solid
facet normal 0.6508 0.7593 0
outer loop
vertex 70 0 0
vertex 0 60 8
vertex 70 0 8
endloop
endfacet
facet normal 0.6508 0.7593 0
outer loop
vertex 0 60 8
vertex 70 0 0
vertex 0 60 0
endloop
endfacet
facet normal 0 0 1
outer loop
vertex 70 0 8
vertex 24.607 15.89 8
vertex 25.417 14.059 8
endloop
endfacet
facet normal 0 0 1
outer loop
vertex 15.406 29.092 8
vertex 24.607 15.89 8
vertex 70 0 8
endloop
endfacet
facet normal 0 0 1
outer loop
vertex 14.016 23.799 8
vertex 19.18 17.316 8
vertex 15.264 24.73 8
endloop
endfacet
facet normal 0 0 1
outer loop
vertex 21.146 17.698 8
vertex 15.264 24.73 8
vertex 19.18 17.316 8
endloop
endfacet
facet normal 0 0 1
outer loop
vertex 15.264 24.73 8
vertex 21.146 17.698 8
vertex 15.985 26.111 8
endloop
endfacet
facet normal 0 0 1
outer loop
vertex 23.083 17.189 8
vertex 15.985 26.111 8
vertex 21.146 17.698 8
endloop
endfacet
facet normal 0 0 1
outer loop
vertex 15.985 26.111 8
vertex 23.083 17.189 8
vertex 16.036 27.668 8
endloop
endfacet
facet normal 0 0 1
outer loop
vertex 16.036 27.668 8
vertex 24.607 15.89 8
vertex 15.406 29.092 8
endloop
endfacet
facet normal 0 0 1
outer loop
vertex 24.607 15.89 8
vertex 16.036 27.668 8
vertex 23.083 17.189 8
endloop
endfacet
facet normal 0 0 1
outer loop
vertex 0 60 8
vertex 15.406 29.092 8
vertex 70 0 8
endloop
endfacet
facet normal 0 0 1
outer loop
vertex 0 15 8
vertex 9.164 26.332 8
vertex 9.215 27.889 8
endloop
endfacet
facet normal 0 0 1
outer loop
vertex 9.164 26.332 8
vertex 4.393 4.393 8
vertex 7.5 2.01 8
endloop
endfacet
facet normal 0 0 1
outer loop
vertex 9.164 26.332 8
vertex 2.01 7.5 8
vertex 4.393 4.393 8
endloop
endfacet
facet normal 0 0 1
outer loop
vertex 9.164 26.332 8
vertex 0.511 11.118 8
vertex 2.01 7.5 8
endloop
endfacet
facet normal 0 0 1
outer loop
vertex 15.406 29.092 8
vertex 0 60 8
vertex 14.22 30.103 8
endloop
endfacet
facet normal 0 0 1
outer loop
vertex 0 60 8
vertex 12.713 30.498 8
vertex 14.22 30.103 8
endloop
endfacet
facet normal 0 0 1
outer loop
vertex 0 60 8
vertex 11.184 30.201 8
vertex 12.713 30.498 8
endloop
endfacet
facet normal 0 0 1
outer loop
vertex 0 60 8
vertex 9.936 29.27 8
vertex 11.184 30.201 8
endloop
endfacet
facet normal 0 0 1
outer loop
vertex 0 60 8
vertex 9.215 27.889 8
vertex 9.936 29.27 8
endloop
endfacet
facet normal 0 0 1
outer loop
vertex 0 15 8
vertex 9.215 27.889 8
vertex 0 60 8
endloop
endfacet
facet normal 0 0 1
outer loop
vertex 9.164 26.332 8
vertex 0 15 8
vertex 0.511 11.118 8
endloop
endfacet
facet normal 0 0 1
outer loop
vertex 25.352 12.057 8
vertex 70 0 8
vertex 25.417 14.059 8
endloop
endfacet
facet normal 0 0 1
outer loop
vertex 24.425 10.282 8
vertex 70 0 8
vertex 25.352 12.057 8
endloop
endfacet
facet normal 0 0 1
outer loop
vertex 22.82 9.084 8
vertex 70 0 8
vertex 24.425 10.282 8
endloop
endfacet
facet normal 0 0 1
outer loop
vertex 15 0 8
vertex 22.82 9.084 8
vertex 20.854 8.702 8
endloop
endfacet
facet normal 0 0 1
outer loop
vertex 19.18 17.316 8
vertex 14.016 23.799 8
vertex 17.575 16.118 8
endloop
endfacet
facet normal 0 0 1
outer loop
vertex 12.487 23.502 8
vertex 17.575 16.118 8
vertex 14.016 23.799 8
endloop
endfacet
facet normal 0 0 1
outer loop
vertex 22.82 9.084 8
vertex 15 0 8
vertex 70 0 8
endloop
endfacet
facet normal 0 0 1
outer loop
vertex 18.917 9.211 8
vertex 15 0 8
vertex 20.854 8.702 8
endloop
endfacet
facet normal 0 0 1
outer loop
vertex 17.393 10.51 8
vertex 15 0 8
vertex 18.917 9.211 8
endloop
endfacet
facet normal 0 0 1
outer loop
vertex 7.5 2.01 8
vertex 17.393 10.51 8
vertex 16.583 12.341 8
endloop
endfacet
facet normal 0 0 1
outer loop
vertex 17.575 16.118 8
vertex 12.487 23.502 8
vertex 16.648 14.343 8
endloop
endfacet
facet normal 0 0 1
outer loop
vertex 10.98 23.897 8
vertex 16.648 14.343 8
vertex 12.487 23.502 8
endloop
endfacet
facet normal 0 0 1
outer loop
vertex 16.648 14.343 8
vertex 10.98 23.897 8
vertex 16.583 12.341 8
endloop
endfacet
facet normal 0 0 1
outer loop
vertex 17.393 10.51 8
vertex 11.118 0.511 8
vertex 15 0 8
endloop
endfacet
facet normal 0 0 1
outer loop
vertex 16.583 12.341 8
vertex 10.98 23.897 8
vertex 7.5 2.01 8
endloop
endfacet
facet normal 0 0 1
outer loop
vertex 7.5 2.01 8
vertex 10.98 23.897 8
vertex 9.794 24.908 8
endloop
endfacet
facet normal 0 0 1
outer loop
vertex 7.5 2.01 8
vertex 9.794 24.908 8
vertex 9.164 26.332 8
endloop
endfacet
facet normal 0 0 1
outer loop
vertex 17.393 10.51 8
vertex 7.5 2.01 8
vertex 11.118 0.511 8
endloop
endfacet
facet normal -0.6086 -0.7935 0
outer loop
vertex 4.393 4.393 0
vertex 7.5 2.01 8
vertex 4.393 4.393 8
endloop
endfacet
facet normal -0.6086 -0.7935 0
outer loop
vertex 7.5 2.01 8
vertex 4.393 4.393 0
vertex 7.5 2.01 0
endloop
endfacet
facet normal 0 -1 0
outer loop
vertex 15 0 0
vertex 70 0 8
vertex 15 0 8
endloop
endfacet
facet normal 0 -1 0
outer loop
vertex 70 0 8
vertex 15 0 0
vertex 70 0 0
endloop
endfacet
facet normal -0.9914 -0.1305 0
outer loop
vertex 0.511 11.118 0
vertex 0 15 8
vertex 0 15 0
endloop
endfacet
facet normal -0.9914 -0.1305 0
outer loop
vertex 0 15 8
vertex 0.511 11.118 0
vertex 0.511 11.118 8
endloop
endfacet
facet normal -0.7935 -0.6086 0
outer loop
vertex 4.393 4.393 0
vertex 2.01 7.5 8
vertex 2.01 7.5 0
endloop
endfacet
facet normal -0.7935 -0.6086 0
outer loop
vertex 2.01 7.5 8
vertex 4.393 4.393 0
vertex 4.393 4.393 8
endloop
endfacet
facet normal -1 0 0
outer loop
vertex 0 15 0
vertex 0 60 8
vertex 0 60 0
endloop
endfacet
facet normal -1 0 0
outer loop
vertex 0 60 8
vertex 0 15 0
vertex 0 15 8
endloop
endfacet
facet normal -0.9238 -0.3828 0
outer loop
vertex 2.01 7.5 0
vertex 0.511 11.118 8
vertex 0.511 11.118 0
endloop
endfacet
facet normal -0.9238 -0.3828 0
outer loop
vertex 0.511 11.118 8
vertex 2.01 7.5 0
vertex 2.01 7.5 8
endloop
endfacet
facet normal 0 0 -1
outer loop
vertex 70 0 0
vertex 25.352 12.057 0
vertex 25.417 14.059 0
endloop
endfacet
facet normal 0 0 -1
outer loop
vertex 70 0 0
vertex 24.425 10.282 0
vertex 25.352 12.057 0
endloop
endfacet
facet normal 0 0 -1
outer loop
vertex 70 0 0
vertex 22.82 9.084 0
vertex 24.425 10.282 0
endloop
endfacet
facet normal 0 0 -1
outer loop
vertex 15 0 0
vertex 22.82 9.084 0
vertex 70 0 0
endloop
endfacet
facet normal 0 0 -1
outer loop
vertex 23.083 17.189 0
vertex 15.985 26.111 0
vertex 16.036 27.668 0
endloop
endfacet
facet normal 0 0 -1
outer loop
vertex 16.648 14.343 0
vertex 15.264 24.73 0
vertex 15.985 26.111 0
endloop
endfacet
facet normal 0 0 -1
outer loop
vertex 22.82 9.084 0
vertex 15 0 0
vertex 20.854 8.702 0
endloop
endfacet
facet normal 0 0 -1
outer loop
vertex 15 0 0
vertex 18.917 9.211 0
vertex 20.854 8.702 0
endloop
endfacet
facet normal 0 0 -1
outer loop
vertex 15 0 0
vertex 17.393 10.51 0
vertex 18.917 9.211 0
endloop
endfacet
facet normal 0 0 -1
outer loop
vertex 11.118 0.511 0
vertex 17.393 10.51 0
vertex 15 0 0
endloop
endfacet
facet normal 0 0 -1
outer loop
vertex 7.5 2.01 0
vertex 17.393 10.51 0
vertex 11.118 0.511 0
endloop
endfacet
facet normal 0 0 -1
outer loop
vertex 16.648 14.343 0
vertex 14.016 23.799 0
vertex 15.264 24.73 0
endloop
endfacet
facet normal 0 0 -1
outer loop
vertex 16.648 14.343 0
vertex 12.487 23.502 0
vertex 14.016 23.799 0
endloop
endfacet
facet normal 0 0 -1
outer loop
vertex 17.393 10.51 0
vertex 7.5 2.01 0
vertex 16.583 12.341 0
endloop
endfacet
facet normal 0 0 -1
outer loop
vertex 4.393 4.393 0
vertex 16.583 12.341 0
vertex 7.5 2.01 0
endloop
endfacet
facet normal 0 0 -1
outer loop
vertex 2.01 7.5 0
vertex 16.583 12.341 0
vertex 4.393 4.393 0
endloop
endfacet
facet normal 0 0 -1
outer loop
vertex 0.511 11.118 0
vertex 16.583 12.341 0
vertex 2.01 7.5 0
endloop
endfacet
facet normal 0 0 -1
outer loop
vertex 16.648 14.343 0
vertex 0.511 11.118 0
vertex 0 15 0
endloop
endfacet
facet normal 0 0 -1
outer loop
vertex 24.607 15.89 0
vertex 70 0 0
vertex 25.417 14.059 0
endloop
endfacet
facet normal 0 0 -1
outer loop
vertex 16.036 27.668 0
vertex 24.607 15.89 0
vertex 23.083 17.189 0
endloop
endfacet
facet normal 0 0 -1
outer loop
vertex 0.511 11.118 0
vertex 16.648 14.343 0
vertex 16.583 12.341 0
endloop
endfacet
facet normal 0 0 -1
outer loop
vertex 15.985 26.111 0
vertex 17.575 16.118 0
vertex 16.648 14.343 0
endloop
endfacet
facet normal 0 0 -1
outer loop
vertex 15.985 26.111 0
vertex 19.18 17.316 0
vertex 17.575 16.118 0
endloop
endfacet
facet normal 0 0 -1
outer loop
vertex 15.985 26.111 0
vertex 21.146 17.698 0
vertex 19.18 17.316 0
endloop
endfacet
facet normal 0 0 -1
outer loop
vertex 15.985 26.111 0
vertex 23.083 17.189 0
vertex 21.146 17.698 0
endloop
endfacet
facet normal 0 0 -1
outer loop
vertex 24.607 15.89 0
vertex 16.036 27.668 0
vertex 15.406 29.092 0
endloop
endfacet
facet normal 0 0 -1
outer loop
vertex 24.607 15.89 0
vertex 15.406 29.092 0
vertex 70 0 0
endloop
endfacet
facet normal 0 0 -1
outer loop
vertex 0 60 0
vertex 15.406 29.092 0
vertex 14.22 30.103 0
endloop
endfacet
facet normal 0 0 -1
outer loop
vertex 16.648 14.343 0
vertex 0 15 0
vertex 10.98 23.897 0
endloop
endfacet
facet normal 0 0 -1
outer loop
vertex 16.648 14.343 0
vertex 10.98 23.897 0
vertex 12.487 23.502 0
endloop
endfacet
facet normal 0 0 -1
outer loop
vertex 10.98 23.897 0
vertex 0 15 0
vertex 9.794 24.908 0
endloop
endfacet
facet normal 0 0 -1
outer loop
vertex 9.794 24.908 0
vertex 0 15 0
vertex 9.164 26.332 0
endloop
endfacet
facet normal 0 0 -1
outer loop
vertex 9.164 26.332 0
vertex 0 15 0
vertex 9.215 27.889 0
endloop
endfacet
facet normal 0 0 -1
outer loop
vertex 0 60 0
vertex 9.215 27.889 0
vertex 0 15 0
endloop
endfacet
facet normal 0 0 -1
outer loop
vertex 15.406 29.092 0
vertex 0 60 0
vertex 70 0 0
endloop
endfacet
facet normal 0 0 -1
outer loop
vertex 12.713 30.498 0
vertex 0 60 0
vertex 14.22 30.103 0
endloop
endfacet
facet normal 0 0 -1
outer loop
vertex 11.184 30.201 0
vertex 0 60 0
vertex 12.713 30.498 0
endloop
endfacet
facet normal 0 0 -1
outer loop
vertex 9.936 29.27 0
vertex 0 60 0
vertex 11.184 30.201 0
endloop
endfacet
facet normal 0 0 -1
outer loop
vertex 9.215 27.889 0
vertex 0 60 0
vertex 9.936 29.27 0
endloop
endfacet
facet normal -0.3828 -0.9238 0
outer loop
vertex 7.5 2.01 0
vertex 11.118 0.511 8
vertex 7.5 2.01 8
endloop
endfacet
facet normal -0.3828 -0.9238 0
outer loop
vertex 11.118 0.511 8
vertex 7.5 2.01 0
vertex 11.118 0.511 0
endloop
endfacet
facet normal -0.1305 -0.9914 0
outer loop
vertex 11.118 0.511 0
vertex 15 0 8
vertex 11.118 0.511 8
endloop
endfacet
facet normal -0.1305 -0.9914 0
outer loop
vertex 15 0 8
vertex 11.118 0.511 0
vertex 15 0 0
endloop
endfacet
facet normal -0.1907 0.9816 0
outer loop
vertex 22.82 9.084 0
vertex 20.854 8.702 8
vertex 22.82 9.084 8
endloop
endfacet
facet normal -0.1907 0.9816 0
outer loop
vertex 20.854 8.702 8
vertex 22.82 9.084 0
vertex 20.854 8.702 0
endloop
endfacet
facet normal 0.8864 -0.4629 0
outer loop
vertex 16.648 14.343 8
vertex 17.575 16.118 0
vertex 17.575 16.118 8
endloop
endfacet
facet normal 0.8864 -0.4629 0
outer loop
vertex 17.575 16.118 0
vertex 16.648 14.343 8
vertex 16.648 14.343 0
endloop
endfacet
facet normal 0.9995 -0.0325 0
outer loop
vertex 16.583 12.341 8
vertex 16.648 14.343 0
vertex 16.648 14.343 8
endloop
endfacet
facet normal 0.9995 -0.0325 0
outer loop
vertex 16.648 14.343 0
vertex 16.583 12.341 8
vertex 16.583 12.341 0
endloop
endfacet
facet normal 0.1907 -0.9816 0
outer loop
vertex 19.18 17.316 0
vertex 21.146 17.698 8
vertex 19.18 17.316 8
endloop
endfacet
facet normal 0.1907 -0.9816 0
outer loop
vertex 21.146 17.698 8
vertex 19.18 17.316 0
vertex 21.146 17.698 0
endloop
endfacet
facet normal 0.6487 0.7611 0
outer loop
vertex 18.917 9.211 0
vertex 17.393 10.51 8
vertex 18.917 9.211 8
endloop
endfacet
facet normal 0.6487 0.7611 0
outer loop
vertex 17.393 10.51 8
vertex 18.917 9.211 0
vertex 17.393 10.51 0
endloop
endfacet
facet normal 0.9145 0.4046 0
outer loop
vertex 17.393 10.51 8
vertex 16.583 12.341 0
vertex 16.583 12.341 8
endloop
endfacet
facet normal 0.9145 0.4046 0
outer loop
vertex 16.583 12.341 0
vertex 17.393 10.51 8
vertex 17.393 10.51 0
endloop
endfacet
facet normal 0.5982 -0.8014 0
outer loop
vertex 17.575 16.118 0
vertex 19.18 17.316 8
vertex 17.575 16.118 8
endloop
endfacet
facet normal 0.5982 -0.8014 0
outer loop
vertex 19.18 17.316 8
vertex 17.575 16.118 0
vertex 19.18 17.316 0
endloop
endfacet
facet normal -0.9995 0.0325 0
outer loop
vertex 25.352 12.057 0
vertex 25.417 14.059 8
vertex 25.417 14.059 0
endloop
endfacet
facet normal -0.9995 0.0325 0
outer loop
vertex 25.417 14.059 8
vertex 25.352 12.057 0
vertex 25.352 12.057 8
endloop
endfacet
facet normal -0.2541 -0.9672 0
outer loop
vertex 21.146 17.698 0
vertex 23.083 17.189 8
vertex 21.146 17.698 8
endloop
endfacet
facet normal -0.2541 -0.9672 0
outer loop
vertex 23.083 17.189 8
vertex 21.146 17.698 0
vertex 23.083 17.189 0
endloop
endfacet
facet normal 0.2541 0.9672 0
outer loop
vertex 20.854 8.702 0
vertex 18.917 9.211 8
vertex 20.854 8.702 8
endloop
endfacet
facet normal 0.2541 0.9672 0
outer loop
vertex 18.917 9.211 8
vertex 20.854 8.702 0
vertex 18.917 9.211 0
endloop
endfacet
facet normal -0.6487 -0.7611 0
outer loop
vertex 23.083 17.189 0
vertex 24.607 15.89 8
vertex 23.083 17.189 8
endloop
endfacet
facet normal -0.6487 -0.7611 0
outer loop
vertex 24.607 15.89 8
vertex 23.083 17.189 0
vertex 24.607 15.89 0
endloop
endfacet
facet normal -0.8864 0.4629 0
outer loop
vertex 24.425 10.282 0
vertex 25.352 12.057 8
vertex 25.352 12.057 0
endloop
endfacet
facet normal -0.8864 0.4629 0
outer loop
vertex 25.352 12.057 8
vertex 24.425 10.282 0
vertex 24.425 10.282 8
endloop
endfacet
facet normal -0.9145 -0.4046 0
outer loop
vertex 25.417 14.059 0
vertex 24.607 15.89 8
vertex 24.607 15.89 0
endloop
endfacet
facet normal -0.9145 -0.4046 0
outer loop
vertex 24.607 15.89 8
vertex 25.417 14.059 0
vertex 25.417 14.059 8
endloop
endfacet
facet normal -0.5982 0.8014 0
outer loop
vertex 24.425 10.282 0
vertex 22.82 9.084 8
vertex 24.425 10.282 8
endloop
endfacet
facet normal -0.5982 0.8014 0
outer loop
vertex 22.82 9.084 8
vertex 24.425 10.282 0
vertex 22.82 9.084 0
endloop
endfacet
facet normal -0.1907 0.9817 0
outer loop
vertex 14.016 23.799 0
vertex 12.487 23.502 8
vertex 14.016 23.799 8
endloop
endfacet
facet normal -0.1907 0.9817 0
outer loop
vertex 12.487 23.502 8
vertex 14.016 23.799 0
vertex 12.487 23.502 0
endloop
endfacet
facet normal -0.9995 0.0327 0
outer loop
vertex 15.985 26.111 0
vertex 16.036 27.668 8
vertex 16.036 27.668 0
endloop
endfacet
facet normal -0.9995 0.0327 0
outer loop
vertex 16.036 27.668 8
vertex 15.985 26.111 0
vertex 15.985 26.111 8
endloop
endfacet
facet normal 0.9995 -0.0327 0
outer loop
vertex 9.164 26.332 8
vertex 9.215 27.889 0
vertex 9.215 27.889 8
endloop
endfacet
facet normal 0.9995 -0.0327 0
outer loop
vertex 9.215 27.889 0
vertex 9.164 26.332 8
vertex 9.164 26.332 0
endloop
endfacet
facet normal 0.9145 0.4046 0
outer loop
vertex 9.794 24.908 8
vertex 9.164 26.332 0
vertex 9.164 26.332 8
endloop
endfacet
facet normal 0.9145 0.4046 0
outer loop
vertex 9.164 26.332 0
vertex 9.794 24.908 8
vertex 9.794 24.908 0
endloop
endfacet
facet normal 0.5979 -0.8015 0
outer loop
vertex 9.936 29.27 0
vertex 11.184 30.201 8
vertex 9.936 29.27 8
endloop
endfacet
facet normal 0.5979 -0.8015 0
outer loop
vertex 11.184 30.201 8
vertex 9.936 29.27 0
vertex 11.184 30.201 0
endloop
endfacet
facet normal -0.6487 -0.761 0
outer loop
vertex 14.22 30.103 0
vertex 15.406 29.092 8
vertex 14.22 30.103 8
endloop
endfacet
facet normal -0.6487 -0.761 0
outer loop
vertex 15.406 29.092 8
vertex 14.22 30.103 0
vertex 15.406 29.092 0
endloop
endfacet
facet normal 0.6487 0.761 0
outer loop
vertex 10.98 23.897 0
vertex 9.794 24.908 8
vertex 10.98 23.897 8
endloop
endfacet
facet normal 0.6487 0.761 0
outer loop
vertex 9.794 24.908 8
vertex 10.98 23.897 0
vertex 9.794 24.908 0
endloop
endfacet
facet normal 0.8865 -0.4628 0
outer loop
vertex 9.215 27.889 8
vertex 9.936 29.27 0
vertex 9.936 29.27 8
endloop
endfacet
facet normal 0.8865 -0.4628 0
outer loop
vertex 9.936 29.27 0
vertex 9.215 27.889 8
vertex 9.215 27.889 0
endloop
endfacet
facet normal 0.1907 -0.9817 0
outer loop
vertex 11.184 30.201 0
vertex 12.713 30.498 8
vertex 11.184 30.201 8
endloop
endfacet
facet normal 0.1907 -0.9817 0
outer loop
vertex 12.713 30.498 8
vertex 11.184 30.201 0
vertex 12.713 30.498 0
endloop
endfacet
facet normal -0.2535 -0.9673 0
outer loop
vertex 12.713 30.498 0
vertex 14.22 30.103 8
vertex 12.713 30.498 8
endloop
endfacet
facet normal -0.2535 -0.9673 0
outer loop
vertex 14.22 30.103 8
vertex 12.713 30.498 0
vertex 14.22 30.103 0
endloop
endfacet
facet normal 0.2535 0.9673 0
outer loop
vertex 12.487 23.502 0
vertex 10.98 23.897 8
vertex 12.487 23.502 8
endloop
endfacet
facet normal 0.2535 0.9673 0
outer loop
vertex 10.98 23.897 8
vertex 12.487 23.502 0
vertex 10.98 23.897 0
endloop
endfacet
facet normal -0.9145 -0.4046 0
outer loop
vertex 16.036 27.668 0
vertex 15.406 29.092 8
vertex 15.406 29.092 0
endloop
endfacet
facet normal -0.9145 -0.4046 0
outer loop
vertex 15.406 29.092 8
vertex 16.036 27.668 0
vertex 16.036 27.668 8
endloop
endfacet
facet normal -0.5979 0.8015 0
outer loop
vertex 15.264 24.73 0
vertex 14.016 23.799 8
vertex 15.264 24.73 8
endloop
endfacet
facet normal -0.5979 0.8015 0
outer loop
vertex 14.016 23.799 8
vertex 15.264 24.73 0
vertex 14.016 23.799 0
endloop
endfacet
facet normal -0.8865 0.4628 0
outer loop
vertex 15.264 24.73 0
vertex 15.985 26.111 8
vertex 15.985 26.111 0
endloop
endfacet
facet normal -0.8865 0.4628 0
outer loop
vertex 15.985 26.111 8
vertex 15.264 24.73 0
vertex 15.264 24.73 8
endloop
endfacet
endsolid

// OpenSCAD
$fn = 32;

// ----------------------------------------------------------------------
// Bracket plate: corner pad 70 x 60, fillet R15
// ----------------------------------------------------------------------

// --- parameters (mm) ---
hole_r = 3.5;             // bolt hole radius
plate_t = 8;              // plate thickness, Z (extrusion height)
leg_a = 70;               // base leg
leg_b = 60;               // height leg
fillet_r = 15;            // right-angle fillet radius

hole_d1 = 2 * hole_r + 2;
hole_d2 = 2 * hole_r;

profile = [[15, 0], [70, 0], [0, 60], [0, 15], [0.511, 11.118], [2.01, 7.5], [4.393, 4.393], [7.5, 2.01], [11.118, 0.511]];  // primary outline, 9 points, counter clockwise
void_1 = [[25.417, 14.059], [24.607, 15.89], [23.083, 17.189], [21.146, 17.698], [19.18, 17.316], [17.575, 16.118], [16.648, 14.343], [16.583, 12.341], [17.393, 10.51], [18.917, 9.211], [20.854, 8.702], [22.82, 9.084], [24.425, 10.282], [25.352, 12.057]];  // mount hole 1, 14 points
void_2 = [[16.036, 27.668], [15.406, 29.092], [14.22, 30.103], [12.713, 30.498], [11.184, 30.201], [9.936, 29.27], [9.215, 27.889], [9.164, 26.332], [9.794, 24.908], [10.98, 23.897], [12.487, 23.502], [14.016, 23.799], [15.264, 24.73], [15.985, 26.111]];  // mount hole 2, 14 points

// --- the one profile operation ---
difference() {
  linear_extrude(height = plate_t) polygon(points = profile);
  translate([0, 0, -1])
    linear_extrude(height = plate_t + 2) polygon(points = void_1);
  translate([0, 0, -1])
    linear_extrude(height = plate_t + 2) polygon(points = void_2);
}
